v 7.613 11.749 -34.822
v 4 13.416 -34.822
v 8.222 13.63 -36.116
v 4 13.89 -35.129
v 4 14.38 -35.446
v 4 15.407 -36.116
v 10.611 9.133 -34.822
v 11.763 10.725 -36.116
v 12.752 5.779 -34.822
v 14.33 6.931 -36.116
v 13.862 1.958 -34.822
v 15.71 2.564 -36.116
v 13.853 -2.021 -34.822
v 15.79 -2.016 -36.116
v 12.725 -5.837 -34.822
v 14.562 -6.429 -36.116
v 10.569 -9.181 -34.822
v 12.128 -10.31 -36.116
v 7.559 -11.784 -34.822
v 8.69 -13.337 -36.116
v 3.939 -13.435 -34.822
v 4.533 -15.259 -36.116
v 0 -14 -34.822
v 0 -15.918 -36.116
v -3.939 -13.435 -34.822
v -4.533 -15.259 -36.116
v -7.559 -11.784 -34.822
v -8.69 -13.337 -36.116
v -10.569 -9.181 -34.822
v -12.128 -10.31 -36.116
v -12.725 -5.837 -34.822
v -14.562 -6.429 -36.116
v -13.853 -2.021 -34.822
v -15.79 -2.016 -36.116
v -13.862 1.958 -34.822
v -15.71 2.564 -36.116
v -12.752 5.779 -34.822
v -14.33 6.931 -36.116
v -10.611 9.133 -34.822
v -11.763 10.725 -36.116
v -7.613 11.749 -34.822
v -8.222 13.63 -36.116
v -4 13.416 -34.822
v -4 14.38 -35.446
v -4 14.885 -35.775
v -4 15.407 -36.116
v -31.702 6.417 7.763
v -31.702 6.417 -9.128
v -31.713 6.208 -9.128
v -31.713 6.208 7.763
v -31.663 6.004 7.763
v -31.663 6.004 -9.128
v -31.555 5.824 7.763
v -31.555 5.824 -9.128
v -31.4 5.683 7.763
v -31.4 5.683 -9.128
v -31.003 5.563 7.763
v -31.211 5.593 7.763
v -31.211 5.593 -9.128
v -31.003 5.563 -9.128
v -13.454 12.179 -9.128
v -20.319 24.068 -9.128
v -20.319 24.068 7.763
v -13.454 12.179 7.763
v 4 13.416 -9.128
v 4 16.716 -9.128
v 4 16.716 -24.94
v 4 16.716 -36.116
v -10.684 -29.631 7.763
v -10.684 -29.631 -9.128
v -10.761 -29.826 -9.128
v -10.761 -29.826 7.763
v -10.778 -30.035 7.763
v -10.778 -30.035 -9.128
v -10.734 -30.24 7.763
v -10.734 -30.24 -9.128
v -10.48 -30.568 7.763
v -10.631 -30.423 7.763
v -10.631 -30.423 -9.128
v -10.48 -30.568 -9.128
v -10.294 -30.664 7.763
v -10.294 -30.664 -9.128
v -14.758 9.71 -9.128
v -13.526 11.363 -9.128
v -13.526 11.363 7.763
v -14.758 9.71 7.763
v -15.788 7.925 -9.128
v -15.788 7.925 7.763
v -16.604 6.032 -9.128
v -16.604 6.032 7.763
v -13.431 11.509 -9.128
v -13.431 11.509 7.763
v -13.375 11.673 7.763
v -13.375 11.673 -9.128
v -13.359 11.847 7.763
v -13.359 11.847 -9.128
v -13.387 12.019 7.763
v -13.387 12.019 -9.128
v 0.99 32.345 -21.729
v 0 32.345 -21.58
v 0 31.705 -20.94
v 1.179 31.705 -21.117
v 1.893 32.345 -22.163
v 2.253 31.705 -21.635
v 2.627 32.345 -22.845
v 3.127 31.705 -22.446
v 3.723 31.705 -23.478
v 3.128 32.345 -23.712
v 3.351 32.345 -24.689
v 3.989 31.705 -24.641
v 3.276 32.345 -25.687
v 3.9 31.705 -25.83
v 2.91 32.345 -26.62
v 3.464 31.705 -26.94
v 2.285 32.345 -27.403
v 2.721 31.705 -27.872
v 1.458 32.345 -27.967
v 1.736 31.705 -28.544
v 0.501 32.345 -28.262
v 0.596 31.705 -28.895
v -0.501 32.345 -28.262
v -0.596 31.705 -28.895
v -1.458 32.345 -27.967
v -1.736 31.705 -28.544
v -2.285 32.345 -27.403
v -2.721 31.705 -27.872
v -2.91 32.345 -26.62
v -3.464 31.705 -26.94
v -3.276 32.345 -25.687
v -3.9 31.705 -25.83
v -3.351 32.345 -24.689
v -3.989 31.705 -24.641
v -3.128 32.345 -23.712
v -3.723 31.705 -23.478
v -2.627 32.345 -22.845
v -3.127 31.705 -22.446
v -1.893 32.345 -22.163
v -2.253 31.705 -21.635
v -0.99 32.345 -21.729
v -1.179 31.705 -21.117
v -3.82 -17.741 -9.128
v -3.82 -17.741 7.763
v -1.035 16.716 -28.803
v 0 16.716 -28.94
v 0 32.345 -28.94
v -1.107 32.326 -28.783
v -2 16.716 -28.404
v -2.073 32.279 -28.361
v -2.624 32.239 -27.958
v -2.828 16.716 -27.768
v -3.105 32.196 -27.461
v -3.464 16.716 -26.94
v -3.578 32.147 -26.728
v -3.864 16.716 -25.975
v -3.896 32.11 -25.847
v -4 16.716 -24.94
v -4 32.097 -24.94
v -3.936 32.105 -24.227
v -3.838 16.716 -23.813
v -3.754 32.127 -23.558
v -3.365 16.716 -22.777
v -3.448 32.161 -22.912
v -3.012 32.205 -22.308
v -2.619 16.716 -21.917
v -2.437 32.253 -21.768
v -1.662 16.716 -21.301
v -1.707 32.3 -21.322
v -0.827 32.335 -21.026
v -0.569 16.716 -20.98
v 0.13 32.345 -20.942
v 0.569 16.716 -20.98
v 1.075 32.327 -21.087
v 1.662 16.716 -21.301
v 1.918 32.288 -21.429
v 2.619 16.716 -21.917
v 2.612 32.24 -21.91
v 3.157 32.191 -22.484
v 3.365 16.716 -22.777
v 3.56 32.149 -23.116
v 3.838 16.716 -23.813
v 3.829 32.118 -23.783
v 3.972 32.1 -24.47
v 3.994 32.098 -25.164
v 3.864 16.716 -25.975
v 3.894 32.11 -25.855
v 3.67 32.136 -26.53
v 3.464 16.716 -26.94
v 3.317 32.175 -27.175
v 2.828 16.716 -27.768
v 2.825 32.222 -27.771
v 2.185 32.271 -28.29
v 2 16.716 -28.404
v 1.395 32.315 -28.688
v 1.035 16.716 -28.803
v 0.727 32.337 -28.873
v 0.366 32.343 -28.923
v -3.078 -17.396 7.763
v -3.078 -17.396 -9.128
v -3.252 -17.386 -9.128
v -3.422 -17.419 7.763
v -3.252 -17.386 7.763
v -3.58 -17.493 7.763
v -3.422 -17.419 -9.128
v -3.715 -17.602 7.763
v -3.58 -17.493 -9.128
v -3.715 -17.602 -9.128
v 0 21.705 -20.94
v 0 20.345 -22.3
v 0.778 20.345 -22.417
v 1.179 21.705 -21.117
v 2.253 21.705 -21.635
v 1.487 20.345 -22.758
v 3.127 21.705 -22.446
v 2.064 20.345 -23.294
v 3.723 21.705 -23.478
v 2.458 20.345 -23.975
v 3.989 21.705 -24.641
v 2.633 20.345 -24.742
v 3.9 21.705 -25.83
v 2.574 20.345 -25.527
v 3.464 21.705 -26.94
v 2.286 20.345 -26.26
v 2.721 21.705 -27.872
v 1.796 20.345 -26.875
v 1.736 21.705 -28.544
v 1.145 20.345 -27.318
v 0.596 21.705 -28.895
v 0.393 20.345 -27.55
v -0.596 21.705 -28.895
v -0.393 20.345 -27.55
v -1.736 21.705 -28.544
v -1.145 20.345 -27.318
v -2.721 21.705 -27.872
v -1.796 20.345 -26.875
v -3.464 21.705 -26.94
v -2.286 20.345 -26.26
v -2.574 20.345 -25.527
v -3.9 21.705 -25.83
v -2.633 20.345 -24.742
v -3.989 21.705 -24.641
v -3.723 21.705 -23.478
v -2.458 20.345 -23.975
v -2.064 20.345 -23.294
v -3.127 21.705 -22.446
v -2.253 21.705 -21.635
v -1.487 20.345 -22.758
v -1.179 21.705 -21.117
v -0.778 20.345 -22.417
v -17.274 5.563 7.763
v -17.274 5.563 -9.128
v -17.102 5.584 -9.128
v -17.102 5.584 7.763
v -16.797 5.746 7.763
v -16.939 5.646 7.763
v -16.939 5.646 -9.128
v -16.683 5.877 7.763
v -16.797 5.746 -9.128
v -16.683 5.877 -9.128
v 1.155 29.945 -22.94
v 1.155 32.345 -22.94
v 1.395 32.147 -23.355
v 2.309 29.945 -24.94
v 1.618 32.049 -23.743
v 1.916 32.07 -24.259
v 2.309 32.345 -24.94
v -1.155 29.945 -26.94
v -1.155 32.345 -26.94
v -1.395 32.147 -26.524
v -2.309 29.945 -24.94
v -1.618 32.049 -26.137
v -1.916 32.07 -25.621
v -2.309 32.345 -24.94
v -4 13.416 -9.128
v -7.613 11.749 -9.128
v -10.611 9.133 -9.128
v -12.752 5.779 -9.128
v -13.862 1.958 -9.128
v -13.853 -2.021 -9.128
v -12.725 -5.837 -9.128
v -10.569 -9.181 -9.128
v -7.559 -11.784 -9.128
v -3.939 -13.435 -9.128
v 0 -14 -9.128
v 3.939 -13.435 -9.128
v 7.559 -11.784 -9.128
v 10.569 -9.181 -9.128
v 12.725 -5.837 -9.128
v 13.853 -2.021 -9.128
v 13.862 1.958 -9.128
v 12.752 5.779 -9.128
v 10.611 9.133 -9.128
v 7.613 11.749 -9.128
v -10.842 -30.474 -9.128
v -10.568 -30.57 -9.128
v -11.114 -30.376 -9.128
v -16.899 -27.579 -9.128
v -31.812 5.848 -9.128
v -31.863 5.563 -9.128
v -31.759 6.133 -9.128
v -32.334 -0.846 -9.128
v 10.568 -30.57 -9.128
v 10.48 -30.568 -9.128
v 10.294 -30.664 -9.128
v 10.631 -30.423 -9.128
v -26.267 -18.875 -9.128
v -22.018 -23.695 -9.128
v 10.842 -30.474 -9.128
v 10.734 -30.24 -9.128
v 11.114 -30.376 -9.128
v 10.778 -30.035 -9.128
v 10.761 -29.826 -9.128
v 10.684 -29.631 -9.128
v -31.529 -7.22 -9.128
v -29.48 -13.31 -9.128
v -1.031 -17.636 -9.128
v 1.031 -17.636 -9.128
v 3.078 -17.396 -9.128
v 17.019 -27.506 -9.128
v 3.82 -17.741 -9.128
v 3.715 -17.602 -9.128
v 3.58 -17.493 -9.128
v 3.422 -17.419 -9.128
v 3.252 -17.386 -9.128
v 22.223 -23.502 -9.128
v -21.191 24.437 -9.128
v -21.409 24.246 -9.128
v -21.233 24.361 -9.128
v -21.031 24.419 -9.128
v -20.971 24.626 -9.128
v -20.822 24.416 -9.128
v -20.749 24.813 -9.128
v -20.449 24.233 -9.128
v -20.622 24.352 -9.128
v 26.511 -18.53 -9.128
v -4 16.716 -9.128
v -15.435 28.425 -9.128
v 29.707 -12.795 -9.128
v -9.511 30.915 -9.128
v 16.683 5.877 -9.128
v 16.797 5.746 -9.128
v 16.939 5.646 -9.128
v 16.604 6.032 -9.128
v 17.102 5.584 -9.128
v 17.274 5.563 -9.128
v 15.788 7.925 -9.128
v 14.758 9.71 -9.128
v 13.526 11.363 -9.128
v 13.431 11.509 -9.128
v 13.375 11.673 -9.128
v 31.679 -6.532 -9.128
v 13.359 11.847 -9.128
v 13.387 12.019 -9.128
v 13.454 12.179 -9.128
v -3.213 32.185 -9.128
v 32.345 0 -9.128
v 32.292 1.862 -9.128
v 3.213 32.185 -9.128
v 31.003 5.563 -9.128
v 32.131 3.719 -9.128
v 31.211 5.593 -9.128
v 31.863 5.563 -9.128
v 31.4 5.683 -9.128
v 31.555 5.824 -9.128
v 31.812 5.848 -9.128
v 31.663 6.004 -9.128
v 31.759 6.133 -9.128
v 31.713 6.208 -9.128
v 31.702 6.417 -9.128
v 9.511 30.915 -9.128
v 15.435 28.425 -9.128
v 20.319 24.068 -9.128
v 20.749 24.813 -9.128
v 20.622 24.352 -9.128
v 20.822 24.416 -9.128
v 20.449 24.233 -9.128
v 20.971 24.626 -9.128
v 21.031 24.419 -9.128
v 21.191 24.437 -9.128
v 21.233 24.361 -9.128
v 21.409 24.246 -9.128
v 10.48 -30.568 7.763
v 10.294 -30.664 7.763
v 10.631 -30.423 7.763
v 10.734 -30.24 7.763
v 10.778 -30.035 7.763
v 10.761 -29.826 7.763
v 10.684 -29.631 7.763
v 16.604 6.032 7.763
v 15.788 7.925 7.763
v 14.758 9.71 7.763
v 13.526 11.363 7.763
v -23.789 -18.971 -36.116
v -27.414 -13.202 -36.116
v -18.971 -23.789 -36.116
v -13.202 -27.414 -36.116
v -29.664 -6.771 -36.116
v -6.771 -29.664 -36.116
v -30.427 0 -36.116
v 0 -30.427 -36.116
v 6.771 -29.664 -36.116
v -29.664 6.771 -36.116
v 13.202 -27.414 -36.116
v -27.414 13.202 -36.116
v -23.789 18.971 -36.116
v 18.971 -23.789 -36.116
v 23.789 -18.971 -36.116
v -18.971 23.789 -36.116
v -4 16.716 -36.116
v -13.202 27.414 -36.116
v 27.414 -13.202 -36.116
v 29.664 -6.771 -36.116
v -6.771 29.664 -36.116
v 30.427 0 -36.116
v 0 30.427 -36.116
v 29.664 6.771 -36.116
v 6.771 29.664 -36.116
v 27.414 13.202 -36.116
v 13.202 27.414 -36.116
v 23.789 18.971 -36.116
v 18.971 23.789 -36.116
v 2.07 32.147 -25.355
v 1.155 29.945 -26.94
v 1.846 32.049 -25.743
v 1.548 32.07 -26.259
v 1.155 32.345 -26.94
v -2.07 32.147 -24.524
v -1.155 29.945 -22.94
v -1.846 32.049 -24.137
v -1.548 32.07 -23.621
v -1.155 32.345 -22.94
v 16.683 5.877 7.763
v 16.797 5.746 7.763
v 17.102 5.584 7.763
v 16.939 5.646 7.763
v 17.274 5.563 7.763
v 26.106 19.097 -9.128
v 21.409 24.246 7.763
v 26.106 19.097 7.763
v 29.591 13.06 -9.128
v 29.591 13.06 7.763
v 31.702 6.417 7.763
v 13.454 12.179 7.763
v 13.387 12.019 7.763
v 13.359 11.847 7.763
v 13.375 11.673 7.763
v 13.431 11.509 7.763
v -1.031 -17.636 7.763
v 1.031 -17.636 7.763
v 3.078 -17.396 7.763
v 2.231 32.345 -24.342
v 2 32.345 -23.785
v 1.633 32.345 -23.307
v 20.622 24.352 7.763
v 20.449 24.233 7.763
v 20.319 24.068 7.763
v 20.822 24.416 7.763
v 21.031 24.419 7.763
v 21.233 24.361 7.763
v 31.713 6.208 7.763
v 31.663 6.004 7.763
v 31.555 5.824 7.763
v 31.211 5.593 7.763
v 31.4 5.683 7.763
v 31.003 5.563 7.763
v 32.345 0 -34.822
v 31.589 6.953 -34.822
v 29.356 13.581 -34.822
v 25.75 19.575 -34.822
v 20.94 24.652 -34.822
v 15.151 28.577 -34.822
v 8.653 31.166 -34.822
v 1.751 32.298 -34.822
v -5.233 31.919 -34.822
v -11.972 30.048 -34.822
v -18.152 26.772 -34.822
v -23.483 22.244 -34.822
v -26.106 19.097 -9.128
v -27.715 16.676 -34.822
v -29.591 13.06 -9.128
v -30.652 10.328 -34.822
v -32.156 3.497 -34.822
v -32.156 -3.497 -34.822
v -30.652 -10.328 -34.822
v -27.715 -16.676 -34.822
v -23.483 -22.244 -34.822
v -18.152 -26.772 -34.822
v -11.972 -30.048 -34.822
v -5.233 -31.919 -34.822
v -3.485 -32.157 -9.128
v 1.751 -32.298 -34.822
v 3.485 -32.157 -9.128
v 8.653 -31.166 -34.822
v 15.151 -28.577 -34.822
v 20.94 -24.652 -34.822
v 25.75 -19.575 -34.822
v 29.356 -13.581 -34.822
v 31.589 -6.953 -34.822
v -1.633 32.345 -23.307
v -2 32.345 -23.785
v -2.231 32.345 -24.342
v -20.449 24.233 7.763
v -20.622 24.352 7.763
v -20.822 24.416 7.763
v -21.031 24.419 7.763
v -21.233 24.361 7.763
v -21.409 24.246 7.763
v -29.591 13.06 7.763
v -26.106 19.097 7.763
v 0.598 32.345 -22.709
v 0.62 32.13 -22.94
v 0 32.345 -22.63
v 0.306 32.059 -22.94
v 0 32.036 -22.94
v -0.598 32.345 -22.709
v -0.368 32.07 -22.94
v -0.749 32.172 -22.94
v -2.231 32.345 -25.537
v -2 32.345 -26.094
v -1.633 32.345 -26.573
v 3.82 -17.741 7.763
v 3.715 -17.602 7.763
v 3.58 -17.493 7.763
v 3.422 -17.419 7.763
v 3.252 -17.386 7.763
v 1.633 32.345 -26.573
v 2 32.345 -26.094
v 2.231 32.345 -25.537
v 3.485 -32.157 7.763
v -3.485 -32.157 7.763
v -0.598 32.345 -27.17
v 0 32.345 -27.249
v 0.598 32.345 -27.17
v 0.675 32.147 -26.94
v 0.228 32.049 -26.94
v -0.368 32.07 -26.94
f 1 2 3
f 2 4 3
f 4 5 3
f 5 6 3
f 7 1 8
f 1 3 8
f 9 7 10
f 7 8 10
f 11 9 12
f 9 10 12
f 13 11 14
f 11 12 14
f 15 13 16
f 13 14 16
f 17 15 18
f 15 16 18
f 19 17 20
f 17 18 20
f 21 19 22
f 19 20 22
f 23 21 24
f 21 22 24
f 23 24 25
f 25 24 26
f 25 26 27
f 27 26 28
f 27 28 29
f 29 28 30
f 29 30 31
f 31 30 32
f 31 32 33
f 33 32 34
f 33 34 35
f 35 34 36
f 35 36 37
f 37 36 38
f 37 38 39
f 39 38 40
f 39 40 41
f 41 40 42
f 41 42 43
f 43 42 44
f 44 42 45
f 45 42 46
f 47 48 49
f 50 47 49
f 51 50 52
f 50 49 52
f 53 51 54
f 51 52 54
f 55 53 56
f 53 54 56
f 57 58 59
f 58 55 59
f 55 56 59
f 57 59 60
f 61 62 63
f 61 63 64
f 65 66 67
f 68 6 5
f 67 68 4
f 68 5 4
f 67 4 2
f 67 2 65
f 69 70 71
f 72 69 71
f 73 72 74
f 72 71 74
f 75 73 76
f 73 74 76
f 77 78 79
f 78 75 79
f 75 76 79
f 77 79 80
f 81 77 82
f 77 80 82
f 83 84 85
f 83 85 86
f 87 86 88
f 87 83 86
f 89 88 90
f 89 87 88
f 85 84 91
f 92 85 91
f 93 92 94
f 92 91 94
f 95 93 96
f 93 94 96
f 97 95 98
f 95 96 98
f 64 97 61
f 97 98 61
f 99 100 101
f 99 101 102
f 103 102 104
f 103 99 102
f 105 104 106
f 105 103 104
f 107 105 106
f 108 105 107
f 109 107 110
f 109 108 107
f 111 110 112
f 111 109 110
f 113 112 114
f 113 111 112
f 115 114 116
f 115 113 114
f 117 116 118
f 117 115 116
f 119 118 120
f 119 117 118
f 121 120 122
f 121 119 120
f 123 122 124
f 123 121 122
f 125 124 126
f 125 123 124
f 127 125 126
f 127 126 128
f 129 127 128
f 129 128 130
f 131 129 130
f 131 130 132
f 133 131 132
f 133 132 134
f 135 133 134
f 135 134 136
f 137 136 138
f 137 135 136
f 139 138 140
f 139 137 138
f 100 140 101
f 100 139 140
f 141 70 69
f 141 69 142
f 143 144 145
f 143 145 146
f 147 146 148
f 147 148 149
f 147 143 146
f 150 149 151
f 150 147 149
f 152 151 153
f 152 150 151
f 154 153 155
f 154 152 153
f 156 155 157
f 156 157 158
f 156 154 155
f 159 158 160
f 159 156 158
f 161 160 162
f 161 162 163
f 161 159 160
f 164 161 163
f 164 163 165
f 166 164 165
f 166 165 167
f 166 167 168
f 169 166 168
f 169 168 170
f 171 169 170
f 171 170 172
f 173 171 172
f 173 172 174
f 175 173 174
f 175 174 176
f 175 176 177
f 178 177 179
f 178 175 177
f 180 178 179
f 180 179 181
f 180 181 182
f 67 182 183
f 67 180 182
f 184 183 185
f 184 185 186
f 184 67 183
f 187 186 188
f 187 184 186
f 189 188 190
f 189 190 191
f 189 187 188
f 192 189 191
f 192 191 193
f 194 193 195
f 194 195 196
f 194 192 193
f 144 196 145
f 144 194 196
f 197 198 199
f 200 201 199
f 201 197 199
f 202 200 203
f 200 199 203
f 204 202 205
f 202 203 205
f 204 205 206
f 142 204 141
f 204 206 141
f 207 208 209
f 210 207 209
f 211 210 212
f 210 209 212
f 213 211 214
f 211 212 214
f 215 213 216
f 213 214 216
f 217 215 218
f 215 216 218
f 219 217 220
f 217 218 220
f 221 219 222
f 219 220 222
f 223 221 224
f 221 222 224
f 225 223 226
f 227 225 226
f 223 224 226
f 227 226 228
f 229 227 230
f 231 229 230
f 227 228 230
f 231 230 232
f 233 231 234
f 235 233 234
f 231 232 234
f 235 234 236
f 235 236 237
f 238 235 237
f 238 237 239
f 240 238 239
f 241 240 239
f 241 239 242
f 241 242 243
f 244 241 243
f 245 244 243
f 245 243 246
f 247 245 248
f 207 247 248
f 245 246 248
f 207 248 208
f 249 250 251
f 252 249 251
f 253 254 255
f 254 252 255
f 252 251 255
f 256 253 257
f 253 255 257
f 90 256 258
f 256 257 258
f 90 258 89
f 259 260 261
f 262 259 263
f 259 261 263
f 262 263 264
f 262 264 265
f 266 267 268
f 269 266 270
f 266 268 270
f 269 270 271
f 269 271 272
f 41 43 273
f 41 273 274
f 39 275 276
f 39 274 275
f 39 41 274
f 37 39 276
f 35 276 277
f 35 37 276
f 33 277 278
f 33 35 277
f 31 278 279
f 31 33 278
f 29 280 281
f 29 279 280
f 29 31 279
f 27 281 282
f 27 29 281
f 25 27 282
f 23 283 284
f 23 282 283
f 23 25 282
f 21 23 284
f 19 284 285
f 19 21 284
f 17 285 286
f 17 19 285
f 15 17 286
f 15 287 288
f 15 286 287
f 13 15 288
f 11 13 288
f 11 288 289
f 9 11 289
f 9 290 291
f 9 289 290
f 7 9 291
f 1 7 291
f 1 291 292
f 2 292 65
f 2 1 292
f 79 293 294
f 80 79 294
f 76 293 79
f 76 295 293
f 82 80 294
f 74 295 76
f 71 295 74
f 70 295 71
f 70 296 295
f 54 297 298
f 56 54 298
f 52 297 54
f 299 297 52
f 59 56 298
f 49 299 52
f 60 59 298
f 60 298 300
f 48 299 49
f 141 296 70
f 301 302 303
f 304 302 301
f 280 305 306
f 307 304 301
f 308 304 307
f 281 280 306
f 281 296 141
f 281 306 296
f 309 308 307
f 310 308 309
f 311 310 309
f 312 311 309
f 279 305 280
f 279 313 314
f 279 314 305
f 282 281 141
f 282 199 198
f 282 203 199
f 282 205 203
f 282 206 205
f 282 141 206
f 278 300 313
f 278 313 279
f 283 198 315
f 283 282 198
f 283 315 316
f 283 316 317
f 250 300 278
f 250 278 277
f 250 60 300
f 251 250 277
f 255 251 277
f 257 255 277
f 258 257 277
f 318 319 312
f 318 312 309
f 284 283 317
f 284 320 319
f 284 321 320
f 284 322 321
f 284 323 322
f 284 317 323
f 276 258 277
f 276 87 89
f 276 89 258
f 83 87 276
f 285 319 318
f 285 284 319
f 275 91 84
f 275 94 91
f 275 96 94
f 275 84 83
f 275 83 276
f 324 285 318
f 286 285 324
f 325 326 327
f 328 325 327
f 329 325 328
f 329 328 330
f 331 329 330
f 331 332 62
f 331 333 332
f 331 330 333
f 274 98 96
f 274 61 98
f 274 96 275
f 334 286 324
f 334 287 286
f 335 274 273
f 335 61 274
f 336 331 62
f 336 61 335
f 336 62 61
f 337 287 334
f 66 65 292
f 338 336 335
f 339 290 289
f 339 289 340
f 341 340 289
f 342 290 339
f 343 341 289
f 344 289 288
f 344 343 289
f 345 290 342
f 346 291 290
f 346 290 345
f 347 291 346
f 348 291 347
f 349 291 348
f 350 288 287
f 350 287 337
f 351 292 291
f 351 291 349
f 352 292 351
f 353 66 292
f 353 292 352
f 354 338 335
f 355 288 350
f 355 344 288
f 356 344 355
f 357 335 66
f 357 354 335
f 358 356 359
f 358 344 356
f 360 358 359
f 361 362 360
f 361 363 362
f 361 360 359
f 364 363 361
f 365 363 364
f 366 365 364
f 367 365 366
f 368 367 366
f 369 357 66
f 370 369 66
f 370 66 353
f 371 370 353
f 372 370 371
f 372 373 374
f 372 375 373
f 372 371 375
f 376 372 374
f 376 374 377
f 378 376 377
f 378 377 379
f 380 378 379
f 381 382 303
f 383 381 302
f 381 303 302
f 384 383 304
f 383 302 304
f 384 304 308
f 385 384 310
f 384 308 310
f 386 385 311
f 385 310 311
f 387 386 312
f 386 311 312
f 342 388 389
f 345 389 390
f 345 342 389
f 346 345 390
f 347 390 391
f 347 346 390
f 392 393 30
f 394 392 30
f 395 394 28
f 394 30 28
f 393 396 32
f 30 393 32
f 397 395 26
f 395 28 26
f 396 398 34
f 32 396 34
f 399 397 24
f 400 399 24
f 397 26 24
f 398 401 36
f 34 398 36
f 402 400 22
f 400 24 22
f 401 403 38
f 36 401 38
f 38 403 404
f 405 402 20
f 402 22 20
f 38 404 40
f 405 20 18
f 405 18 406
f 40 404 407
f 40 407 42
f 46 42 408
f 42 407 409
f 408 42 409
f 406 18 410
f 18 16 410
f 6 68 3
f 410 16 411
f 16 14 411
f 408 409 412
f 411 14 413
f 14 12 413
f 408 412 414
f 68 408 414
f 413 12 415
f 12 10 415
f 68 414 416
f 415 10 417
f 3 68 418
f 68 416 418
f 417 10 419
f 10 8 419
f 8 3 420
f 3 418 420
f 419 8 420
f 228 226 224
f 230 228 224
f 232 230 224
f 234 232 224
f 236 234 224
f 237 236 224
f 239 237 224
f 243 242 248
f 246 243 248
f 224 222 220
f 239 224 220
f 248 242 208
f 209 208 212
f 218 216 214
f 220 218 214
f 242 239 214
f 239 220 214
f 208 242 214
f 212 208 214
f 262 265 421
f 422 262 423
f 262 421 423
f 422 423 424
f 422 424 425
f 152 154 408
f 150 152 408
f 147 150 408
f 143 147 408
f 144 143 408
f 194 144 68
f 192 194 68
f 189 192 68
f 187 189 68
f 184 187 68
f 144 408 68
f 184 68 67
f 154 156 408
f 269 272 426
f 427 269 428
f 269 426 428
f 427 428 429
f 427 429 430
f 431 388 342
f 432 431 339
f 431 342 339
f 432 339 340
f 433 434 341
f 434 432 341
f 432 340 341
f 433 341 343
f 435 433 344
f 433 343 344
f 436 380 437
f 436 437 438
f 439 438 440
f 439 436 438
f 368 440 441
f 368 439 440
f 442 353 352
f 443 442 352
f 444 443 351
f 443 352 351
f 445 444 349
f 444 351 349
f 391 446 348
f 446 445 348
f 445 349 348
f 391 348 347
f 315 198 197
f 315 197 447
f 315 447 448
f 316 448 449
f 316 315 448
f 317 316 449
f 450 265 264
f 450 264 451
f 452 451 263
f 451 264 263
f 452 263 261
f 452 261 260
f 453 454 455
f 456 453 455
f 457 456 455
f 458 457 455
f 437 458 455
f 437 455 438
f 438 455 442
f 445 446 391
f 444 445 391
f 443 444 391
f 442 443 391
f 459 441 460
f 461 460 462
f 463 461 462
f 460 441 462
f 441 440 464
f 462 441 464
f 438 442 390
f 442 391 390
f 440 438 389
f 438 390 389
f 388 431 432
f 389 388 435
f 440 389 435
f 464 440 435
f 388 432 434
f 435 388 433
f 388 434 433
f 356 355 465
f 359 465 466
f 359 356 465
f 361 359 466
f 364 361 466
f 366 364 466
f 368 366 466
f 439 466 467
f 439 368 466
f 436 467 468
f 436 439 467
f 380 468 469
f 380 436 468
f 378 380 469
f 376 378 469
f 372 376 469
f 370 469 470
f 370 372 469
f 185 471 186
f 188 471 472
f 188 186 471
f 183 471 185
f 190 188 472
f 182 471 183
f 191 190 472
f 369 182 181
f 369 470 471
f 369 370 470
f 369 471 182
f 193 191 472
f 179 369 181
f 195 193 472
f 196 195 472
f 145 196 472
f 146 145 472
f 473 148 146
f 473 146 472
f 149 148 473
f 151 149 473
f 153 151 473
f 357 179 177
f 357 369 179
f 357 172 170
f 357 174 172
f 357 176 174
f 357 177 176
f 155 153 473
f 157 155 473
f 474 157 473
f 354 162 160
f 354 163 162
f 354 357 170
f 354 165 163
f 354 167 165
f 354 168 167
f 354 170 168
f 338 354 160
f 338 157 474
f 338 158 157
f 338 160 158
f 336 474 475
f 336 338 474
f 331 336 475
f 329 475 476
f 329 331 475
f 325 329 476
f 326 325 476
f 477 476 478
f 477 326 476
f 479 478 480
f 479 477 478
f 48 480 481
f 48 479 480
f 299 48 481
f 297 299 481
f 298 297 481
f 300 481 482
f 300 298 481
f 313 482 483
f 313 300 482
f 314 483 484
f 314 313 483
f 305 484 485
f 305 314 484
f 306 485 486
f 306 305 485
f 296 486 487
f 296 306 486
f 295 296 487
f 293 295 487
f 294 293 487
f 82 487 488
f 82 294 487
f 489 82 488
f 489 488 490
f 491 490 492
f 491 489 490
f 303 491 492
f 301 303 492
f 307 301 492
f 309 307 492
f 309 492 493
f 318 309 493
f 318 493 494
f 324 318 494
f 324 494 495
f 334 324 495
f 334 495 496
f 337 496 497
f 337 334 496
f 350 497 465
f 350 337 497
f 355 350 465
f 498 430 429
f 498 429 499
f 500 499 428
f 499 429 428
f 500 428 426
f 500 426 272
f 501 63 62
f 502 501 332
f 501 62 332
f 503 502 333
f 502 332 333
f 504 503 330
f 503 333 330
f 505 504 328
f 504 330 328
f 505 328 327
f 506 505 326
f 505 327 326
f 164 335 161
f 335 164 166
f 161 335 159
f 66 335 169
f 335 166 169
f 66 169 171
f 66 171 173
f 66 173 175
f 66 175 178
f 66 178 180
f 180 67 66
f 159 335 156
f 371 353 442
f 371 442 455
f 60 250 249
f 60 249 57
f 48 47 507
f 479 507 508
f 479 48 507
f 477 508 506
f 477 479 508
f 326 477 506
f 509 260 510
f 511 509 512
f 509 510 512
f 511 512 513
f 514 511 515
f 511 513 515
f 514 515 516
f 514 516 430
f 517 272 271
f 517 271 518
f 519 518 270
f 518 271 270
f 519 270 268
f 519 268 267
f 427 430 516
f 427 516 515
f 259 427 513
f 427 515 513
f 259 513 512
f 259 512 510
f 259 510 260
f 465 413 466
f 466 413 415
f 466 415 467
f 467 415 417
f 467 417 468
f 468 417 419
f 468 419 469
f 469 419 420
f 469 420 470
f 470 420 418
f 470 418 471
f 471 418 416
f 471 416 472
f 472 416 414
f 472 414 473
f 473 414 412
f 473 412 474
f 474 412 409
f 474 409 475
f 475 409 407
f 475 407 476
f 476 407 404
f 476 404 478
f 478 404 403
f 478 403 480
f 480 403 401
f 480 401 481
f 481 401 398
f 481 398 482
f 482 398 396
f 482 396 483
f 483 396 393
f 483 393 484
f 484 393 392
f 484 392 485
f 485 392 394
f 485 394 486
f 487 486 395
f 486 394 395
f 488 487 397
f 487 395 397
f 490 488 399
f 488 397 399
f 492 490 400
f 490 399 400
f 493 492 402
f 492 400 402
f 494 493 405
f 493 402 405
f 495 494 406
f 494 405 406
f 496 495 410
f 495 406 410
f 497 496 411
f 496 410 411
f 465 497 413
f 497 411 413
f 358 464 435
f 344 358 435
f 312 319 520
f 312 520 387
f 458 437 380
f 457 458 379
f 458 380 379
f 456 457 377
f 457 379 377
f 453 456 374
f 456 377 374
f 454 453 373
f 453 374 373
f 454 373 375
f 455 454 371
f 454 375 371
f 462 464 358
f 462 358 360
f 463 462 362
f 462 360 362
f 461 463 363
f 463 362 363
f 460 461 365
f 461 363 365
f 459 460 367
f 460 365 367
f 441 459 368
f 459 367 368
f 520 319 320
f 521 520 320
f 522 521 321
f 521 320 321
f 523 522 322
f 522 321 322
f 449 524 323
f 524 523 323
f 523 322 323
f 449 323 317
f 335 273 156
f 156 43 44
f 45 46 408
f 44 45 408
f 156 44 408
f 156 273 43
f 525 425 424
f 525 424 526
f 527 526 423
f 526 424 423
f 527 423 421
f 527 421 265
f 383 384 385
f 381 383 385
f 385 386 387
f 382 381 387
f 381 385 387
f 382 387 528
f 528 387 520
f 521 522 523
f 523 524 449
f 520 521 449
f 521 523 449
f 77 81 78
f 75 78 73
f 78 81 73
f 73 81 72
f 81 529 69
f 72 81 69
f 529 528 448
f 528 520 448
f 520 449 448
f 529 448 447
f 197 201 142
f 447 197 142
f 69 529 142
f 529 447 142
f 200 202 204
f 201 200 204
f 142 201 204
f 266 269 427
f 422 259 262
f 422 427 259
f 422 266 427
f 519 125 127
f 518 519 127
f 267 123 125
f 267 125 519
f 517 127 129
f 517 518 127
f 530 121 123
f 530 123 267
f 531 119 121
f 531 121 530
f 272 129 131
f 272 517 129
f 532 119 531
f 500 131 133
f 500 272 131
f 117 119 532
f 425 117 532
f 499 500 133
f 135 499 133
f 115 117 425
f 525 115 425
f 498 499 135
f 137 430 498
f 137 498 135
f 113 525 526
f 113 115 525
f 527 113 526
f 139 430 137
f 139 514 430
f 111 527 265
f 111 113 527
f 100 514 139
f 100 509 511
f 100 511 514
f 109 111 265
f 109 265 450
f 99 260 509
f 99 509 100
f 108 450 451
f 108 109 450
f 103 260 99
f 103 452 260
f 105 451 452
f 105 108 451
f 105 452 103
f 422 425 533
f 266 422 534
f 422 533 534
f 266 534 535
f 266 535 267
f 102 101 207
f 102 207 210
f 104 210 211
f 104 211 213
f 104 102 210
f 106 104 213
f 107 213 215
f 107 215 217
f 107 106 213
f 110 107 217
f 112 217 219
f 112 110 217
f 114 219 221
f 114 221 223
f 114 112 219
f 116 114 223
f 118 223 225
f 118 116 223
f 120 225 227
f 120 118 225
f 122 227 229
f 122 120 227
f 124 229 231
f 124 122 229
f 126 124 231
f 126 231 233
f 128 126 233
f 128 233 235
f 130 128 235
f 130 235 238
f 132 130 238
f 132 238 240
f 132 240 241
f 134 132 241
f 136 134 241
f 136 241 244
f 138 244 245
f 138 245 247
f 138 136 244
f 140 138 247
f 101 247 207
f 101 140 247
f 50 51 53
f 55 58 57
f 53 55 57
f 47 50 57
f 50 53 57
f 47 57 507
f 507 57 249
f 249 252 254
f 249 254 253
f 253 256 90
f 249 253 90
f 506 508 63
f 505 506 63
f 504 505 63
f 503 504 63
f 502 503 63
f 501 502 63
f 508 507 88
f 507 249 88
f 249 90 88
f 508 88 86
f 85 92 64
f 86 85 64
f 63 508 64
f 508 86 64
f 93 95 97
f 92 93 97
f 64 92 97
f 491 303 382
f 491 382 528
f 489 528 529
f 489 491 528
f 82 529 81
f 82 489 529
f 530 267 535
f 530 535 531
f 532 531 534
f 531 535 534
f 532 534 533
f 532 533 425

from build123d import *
from OCP.BRepFilletAPI import BRepFilletAPI_MakeChamfer

# Parameters (mm, degrees)
BOSS_EXTRUDE1_START      = -9.128125
SKETCH1_R                = 32.3453125
BOSS_EXTRUDE1_DEPTH      = 26.9875
BOSS_EXTRUDE2_DEPTH      = 16.891
FILLET1_R                = 0.713235825
CIRPATTERN1_COUNT        = 3
FILLET1_OF_CIRPATTERN1_R = 0.713235825
CUT_EXTRUDE5_DEPTH       = 59.281874117
CUT_EXTRUDE5_DEPTH_BACK  = 59.281874117
SKETCH15_R               = 14
CHAMFER1_SIZE            = 1.2938125
CHAMFER1_SIZE2           = 1.918155913
CUT_EXTRUDE1_DEPTH       = 59.281874117
CUT_EXTRUDE1_DEPTH_BACK  = 59.281874117
SKETCH5_R                = 4
CUT_EXTRUDE2_DEPTH       = 59.281874117
SKETCH6_R                = 4
BOSS_EXTRUDE3_DEPTH      = 12
CUT_EXTRUDE3_DEPTH       = 2.4
CHAMFER3_SIZE            = 0.64
CHAMFER4_SIZE            = 1.36


with BuildPart() as part:
    # Sketch1 → Boss-Extrude1 (new body)
    with BuildSketch(Plane.XY.offset(BOSS_EXTRUDE1_START)):
        Circle(SKETCH1_R)
    extrude(amount=-BOSS_EXTRUDE1_DEPTH)

    # Sketch2 → Boss-Extrude2 (add)
    with BuildSketch(Plane.XY.offset(-9.128125)):
        with BuildLine():
            Line((-11.114350717, -30.375820135), (-3.566179127, -17.302003437))
            ThreePointArc((-3.566179127, -17.302003437), (0, -17.6657), (3.566179127, -17.302003437))
            Line((3.566179127, -17.302003437), (11.114350717, -30.375820135))
            ThreePointArc((11.114350717, -30.375820135), (0, -32.3453125), (-11.114350717, -30.375820135))
        make_face()
    boss_extrude2 = extrude(amount=BOSS_EXTRUDE2_DEPTH)

    # Fillet1
    # the kernel refuses this fillet: 0.713235825 mm, written as the material it takes off along each edge
    with BuildSketch(Plane(origin=(-11.114350717, -30.375820135, -9.128125), x_dir=(0.9436455754007305, -0.3309577435664929, 0), z_dir=(0, 0, 1))) as fillet1_piece_1:
        with BuildLine():
            CenterArc((0.860200247, 0.713171354), FILLET1_R, 169.326916929, 101.443469756)
            Line((0.159303464, 0.845266176), (0, 0))
            ThreePointArc((0, 0), (0.434894987, -0.002923796), (0.869789973, 0))
        make_face()
    extrude(amount=19.065474933, mode=Mode.SUBTRACT)
    with BuildSketch(Plane(origin=(11.114350717, -30.375820135, -9.128125), x_dir=(-0.9436455754007282, -0.3309577435664989, 0), z_dir=(0, 0, 1))) as fillet1_piece_2:
        with BuildLine():
            CenterArc((0.860200247, -0.713171354), FILLET1_R, 89.229613314, 101.443469756)
            Line((0.159303464, -0.845266176), (0, 0))
            ThreePointArc((0, 0), (0.434894987, 0.002923796), (0.869789973, 0))
        make_face()
    extrude(amount=19.065474933, mode=Mode.SUBTRACT)
    with BuildSketch(Plane(origin=(3.566179127, -17.302003437, -9.128125), x_dir=(0.500000000000002, -0.8660254037844376, 0), z_dir=(0, 0, 1))) as fillet1_piece_3:
        with BuildLine():
            CenterArc((0.507170112, -0.713235825), FILLET1_R, 90, 70.033604576)
            ThreePointArc((-0.163195289, -0.469687941), (-0.07994504, -0.235418176), (0, 0))
            Line((0, 0), (0.507170112, 0))
        make_face()
    extrude(amount=18.158925279, mode=Mode.SUBTRACT)
    with BuildSketch(Plane(origin=(-3.566179127, -17.302003437, -9.128125), x_dir=(0.9821562739684868, -0.18806661985673784, 0), z_dir=(0, 0, 1))) as fillet1_piece_4:
        with BuildLine():
            CenterArc((0.507269431, -0.71316519), FILLET1_R, 90.806371221, 70.033604577)
            Line((-0.166457119, -0.479075724), (0, 0))
            ThreePointArc((0, 0), (0.248615901, -0.001749518), (0.497231801, 0))
        make_face()
    extrude(amount=18.158925279, mode=Mode.SUBTRACT)

    # CirPattern1: Boss-Extrude2 ×3 about axis
    cirpattern1_axis = Axis((0, 0, 0), (0, 0, 1))
    for i in range(1, CIRPATTERN1_COUNT):
        add(boss_extrude2.rotate(cirpattern1_axis, i * 360 / CIRPATTERN1_COUNT))

    # Fillet1 of CirPattern1
    # the kernel refuses this fillet: 0.713235825 mm, written as the material it takes off along each edge
    with BuildSketch(Plane(origin=(31.863407256, 5.5626, -9.128125), x_dir=(-0.18520497419260348, 0.9826999122490635, 0), z_dir=(0, 0, 1)), Plane(origin=(-20.749056539, 24.813220135, -9.128125), x_dir=(-0.7584406012081224, -0.6517421686825718, 0), z_dir=(0, 0, 1))) as fillet1_of_cirpattern1_piece_1:
        with BuildLine():
            CenterArc((0.860200247, 0.713171354), FILLET1_OF_CIRPATTERN1_R, 169.326916929, 101.443469756)
            Line((0.159303464, 0.845266176), (0, 0))
            ThreePointArc((0, 0), (0.434894987, -0.002923796), (0.869789973, 0))
        make_face()
    extrude(amount=19.065474933, mode=Mode.SUBTRACT)
    with BuildSketch(Plane(origin=(20.749056539, 24.813220135, -9.128125), x_dir=(0.7584406012081266, -0.6517421686825667, 0), z_dir=(0, 0, 1)), Plane(origin=(-31.863407256, 5.5626, -9.128125), x_dir=(0.18520497419260348, 0.9826999122490635, 0), z_dir=(0, 0, 1))) as fillet1_of_cirpattern1_piece_2:
        with BuildLine():
            CenterArc((0.860200247, -0.713171354), FILLET1_OF_CIRPATTERN1_R, 89.229613314, 101.443469756)
            Line((0.159303464, -0.845266176), (0, 0))
            ThreePointArc((0, 0), (0.434894987, 0.002923796), (0.869789973, 0))
        make_face()
    extrude(amount=19.065474933, mode=Mode.SUBTRACT)
    with BuildSketch(Plane(origin=(13.200884949, 11.739403437, -9.128125), x_dir=(0.49999999999999967, 0.8660254037844388, 0), z_dir=(0, 0, 1)), Plane(origin=(-16.767064076, 5.5626, -9.128125), x_dir=(-1, 0, 0), z_dir=(0, 0, 1))) as fillet1_of_cirpattern1_piece_3:
        with BuildLine():
            CenterArc((0.507170112, -0.713235825), FILLET1_OF_CIRPATTERN1_R, 90, 70.033604576)
            ThreePointArc((-0.163195289, -0.469687941), (-0.07994504, -0.235418176), (0, 0))
            Line((0, 0), (0.507170112, 0))
        make_face()
    extrude(amount=18.158925279, mode=Mode.SUBTRACT)
    with BuildSketch(Plane(origin=(16.767064076, 5.5626, -9.128125), x_dir=(-0.3282076665844337, 0.9446055936713488, 0), z_dir=(0, 0, 1)), Plane(origin=(-13.200884949, 11.739403437, -9.128125), x_dir=(-0.6539486073840537, -0.7565389738146059, 0), z_dir=(0, 0, 1))) as fillet1_of_cirpattern1_piece_4:
        with BuildLine():
            CenterArc((0.507269431, -0.71316519), FILLET1_OF_CIRPATTERN1_R, 90.806371221, 70.033604577)
            Line((-0.166457119, -0.479075724), (0, 0))
            ThreePointArc((0, 0), (0.248615901, -0.001749518), (0.497231801, 0))
        make_face()
    extrude(amount=18.158925279, mode=Mode.SUBTRACT)

    # Sketch15 → Cut-Extrude5 (cut, two sides: drawn at the far end of the back side and taken through both)
    with BuildSketch(Plane.XY.offset(-CUT_EXTRUDE5_DEPTH_BACK)):
        Circle(SKETCH15_R)
    extrude(amount=CUT_EXTRUDE5_DEPTH + CUT_EXTRUDE5_DEPTH_BACK, mode=Mode.SUBTRACT)

    # Chamfer1: one chamfer whose edges measure the first distance from different faces: ONE call of the kernel's chamfer builder (chamfer() names one face for all edges)
    chamfer1_edges_1 = [part.edges().sort_by_distance(p)[0] for p in [
        (-32.3453125, 0, -36.115625),
    ]]
    chamfer1_side_1 = [part.faces().sort_by_distance(p)[0] for p in [
        (-32.3453125, 0, -22.621875),
    ]]
    chamfer1_edges_2 = [part.edges().sort_by_distance(p)[0] for p in [
        (-14, 0, -36.115625),
    ]]
    chamfer1_side_2 = [part.faces().sort_by_distance(p)[0] for p in [
        (-14, 0, -22.621875),
    ]]
    chamfer1 = BRepFilletAPI_MakeChamfer(part.part.solid().wrapped)
    for e in chamfer1_edges_1:
        chamfer1.Add(CHAMFER1_SIZE, CHAMFER1_SIZE2, e.wrapped, chamfer1_side_1[0].wrapped)  # the first distance lies on this face
    for e in chamfer1_edges_2:
        chamfer1.Add(CHAMFER1_SIZE, CHAMFER1_SIZE2, e.wrapped, chamfer1_side_2[0].wrapped)  # the first distance lies on this face
    add(Compound.cast(chamfer1.Shape()), mode=Mode.REPLACE)

    # Sketch4 → Cut-Extrude1 (cut, two sides: drawn at the far end of the back side and taken through both)
    with BuildSketch(Plane.XY.offset(-CUT_EXTRUDE1_DEPTH_BACK)):
        with BuildLine():
            Line((-4, 16.716407865), (4, 16.716407865))
            Line((4, 16.716407865), (4, 13.416407865))
            ThreePointArc((4, 13.416407865), (0, 14), (-4, 13.416407865))
            Line((-4, 13.416407865), (-4, 16.716407865))
        make_face()
    extrude(amount=CUT_EXTRUDE1_DEPTH + CUT_EXTRUDE1_DEPTH_BACK, mode=Mode.SUBTRACT)

    # Sketch5 → Cut-Extrude2 (cut, through all)
    with BuildSketch(Plane(origin=(0, 0, 0), x_dir=(1, 0, 0), z_dir=(0, 1, 0))):
        with Locations(Location((0, 24.939625, 0), (0, 0, 90))):
            Circle(SKETCH5_R)
    extrude(amount=CUT_EXTRUDE2_DEPTH, mode=Mode.SUBTRACT)


with BuildPart() as body_2:
    # Sketch6 → Boss-Extrude3 (new body)
    with BuildSketch(Plane(origin=(0, 32.3453125, 0), x_dir=(-1, 0, 0), z_dir=(0, 1, 0))):
        with Locations(Location((0, -24.939625, 0), (0, 0, 90))):
            Circle(SKETCH6_R)
    extrude(amount=-BOSS_EXTRUDE3_DEPTH)

    # Sketch8 → Cut-Extrude3 (cut)
    with BuildSketch(Plane(origin=(0, 32.3453125, 0), x_dir=(1, 0, 0), z_dir=(0, 1, 0))):
        Polygon((1.154700538, 22.939625), (2.309401077, 24.939625), (1.154700538, 26.939625), (-1.154700538, 26.939625), (-2.309401077, 24.939625), (-1.154700538, 22.939625), align=None)
    extrude(amount=-CUT_EXTRUDE3_DEPTH, mode=Mode.SUBTRACT)

    # Cut-Extrude4 cone 1 section (through the dimple's axis) → Cut-Extrude4 (revolve, cut)
    with BuildSketch(Plane(origin=(0, 32.3453125, -24.939625), x_dir=(0, 0, 1), z_dir=(1, 0, 0))):
        Polygon((0, 0), (2.309401077, 0), (0, 2.309401077), align=None)
    revolve(axis=Axis((0, 32.3453125, -24.939625), (0, -1, 0)), mode=Mode.SUBTRACT)

    # Chamfer3
    chamfer3_edges = [body_2.edges().sort_by_distance(p)[0] for p in [
        (0, 32.3453125, -28.939625),
    ]]
    chamfer(chamfer3_edges, length=CHAMFER3_SIZE)

    # Chamfer4
    chamfer4_edges = [body_2.edges().sort_by_distance(p)[0] for p in [
        (0, 20.3453125, -28.939625),
    ]]
    chamfer(chamfer4_edges, length=CHAMFER4_SIZE)


solid = Compound([part.part, body_2.part])
